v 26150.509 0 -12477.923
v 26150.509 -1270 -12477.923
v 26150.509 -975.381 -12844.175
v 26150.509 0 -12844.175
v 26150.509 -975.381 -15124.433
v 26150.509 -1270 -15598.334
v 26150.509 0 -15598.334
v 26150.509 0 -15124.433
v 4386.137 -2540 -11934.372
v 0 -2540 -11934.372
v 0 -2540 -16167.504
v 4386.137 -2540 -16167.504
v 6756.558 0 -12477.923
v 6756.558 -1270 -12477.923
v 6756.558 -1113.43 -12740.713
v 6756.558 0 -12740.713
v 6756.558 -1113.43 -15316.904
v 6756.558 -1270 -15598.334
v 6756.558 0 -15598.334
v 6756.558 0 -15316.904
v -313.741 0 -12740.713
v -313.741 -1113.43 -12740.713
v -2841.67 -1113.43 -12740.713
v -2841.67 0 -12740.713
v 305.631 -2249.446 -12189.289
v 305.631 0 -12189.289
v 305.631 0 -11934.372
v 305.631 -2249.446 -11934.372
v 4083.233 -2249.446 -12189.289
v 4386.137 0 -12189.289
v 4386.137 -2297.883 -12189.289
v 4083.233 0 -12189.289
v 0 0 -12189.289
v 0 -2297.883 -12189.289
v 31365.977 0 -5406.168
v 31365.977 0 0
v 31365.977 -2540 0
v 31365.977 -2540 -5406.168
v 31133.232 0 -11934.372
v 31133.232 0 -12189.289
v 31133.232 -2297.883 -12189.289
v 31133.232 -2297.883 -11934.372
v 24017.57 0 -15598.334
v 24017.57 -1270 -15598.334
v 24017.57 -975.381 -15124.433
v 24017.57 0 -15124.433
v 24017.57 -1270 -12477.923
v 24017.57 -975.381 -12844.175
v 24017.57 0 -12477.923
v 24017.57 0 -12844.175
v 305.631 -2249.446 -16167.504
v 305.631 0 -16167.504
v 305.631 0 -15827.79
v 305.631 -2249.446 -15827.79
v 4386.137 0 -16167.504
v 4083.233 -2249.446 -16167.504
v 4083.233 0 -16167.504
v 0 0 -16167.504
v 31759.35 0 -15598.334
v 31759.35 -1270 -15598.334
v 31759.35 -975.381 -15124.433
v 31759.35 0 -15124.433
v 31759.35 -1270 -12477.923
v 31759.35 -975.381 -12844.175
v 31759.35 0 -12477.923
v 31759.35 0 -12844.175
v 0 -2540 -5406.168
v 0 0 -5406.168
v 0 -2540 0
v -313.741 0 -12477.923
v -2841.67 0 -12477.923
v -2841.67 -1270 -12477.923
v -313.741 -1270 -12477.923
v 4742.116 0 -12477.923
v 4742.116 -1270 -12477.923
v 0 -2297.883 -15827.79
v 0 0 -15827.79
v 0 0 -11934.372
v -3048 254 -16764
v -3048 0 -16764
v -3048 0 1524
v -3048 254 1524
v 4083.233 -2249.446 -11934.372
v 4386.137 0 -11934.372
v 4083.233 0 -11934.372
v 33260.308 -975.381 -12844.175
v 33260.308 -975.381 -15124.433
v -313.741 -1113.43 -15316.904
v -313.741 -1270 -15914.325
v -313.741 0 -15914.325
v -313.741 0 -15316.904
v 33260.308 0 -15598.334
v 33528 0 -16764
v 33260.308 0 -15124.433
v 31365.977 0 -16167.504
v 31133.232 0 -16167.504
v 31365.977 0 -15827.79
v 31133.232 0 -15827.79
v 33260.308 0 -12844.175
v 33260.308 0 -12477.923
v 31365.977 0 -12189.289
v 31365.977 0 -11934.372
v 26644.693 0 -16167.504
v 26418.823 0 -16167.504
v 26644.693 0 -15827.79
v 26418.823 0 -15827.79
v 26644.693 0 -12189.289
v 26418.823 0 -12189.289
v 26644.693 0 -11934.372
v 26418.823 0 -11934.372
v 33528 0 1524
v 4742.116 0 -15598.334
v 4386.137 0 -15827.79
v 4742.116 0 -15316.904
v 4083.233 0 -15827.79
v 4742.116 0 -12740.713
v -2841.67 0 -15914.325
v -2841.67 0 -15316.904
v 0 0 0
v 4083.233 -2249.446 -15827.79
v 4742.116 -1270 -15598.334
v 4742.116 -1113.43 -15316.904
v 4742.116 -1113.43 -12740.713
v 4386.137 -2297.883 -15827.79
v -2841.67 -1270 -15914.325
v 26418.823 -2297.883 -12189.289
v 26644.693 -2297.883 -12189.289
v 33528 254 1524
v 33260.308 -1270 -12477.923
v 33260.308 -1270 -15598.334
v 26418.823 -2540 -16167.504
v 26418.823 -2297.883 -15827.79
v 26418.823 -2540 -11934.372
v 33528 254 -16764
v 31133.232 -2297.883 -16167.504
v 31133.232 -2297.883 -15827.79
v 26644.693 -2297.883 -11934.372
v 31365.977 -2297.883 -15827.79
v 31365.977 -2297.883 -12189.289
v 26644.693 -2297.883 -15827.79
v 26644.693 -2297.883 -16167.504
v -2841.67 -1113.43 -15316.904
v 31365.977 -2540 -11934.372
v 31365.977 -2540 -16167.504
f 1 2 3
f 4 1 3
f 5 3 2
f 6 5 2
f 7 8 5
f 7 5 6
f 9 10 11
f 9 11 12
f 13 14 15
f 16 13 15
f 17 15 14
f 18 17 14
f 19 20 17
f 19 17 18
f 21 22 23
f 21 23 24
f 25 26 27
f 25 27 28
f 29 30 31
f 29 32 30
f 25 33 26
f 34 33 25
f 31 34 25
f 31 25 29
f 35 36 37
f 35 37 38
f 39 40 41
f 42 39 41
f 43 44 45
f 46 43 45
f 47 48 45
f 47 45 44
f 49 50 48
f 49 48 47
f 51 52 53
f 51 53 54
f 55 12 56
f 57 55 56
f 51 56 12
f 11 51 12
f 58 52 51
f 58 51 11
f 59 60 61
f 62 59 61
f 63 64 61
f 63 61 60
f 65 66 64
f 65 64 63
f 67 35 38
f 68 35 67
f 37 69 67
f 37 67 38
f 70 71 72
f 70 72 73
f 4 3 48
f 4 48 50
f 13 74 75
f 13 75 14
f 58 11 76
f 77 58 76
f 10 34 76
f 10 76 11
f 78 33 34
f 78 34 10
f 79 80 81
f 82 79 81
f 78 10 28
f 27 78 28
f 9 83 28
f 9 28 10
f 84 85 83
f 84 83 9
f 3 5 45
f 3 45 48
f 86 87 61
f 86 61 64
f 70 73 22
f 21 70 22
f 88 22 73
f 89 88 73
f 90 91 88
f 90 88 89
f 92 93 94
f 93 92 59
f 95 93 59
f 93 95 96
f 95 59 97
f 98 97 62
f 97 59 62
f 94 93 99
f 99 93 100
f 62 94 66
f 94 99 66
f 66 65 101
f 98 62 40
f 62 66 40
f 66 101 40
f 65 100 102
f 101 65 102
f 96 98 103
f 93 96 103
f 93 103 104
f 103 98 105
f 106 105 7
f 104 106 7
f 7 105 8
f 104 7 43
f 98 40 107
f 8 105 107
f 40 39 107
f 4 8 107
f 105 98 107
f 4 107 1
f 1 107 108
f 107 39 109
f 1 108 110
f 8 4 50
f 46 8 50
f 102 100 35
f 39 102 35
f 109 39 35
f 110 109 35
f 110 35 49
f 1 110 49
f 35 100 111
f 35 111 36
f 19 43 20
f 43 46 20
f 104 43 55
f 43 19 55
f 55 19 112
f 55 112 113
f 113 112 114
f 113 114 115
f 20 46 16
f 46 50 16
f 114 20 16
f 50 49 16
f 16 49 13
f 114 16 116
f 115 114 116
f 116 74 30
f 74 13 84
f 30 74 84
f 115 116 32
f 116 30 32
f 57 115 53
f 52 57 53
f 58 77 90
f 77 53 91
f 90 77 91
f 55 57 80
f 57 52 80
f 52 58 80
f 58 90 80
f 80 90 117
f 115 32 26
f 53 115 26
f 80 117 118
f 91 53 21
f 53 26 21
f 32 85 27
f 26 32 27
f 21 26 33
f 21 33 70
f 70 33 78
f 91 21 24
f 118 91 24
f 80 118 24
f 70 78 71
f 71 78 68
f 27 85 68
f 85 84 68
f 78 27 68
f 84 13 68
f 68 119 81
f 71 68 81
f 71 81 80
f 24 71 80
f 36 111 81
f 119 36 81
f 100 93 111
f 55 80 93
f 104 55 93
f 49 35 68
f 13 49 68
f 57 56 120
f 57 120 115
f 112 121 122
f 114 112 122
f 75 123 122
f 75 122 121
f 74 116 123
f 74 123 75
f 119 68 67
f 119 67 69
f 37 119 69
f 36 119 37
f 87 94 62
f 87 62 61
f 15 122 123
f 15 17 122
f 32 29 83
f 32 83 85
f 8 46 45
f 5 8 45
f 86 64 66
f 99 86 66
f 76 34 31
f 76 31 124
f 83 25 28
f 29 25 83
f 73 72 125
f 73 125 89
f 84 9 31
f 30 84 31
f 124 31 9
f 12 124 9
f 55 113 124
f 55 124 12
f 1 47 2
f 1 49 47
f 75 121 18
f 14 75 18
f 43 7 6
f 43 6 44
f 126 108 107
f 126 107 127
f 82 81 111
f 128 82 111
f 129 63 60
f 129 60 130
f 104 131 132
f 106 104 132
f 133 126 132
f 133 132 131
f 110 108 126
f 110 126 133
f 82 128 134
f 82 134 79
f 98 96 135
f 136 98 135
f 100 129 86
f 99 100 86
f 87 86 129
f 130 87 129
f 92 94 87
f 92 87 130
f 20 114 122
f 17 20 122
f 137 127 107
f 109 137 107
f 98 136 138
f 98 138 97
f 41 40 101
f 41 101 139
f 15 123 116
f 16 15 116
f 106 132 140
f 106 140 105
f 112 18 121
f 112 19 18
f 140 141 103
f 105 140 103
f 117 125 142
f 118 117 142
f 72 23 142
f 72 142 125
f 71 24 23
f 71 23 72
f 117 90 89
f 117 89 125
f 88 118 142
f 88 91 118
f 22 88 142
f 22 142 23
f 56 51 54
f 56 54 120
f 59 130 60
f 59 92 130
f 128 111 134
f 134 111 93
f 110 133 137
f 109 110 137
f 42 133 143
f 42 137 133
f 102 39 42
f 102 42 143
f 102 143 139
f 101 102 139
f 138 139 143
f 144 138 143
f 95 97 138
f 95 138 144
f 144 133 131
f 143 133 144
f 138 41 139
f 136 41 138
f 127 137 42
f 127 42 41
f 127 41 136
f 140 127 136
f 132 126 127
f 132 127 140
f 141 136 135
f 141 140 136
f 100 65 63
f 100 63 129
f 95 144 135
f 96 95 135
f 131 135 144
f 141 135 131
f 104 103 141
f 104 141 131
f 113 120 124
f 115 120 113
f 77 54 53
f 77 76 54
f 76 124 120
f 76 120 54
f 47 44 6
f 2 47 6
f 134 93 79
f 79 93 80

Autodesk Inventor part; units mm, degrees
ref_plane "YZ Plane" through (0, 0, 0) normal (1, 0, 0) x (0, 1, 0)
ref_plane "XZ Plane" through (0, 0, 0) normal (0, 1, 0) x (-1, 0, 0)
ref_plane "XY Plane" through (0, 0, 0) normal (0, 0, 1) x (1, 0, 0)
sketch "Sketch1" plane through (0, 0, 0) normal (0, 1, 0) x (-1, 0, 0)
  line L0 (3048, 1524) -> (-3048, 1524)
  line L1 (-3048, 1524) -> (-3048, -1524)
  line L2 (-3048, -1524) -> (3048, -1524)
  line L3 (3048, -1524) -> (3048, 1524)
  line L4 (3048, 1524) -> (-3048, -1524) construction
  line L5 (-3048, 1524) -> (3048, -1524) construction
  point P0 (0, 0)
  dimension "d0" = 6096
  dimension "d1" = 3048
extrude "Extrusion1" add sketch "Sketch1" along normal blind 254
pattern_linear "Rectangular Pattern1" count 6 spacing 6096 along (1, 0, 0) count 6 spacing 3048 along (0, 0, -1) of "Extrusion1"
sketch "Sketch4" plane through (0, 0, 0) normal (0, -1, 0) x (1, 0, 0)
  line L0 (0, 0) -> (31365.9771, 0)
  line L1 (31365.9771, 0) -> (31365.9771, -5406.1685)
  line L2 (31365.9771, -5406.1685) -> (0, -5406.1685)
  line L3 (0, -5406.1685) -> (0, 0)
  line L4 (0, -11934.372) -> (4386.1366, -11934.372)
  line L5 (4386.1366, -11934.372) -> (4386.1366, -16167.5039)
  line L6 (4386.1366, -16167.5039) -> (0, -16167.5039)
  line L7 (0, -16167.5039) -> (0, -11934.372)
  line L8 (26418.823, -11934.372) -> (31365.9771, -11934.372)
  line L9 (31365.9771, -11934.372) -> (31365.9771, -16167.5039)
  line L10 (31365.9771, -16167.5039) -> (26418.823, -16167.5039)
  line L11 (26418.823, -16167.5039) -> (26418.823, -11934.372)
extrude "Extrusion4" add sketch "Sketch4" along normal blind 2540
sketch "Sketch5" plane through (4386.1366, 0, -16167.5039) normal (0, 0, -1) x (-1, 0, 0)
  line L0 (4080.5054, -2249.446) -> (302.9032, -2249.446)
  line L1 (302.9032, -2249.446) -> (302.9032, 0)
  line L2 (302.9032, 0) -> (4080.5054, 0)
  line L3 (4080.5054, 0) -> (4080.5054, -2249.446)
  point P0 (4386.1366, 0)
sketch "Sketch6" plane through (0, 0, -16167.5039) normal (-1, 0, 0) x (0, 0, 1)
  line L0 (17691.5039, 0) -> (-596.4961, 0) projected
  line L1 (3978.2146, -2297.8832) -> (339.7137, -2297.8832)
  line L2 (339.7137, -2297.8832) -> (339.7137, 0)
  line L3 (339.7137, 0) -> (3978.2146, 0)
  line L4 (3978.2146, 0) -> (3978.2146, -2297.8832)
  point P0 (16167.5039, 0)
extrude "Extrusion5" cut sketch "Sketch6" against normal through all
extrude "Extrusion6" cut sketch "Sketch5" against normal blind 5080
sketch "Sketch7" plane through (31365.9771, 0, -16167.5039) normal (0, 0, -1) x (-1, 0, 0)
  line L0 (0, 0) -> (4947.1541, 0) projected
  line L1 (4947.1541, -2297.8832) -> (0, -2297.8832) projected
  line L2 (4721.2839, 0) -> (232.745, 0)
  line L3 (232.745, 0) -> (232.745, -2297.8832)
  line L4 (232.745, -2297.8832) -> (4721.2839, -2297.8832)
  line L5 (4721.2839, -2297.8832) -> (4721.2839, 0)
  point P0 (31365.9771, 0)
extrude "Extrusion7" cut sketch "Sketch7" against normal blind 5080
sketch "Sketch8" plane through (0, 0, 0) normal (0, -1, 0) x (1, 0, 0)
  line L0 (-2841.6696, -12477.9229) -> (-313.7412, -12477.9229)
  line L1 (-313.7412, -12477.9229) -> (-313.7412, -15914.3253)
  line L2 (-313.7412, -15914.3253) -> (-2841.6696, -15914.3253)
  line L3 (-2841.6696, -15914.3253) -> (-2841.6696, -12477.9229)
  line L4 (31759.3504, -12477.9229) -> (33260.3079, -12477.9229)
  line L5 (33260.3079, -12477.9229) -> (33260.3079, -15598.3343)
  line L6 (33260.3079, -15598.3343) -> (31759.3504, -15598.3343)
  line L7 (31759.3504, -15598.3343) -> (31759.3504, -12477.9229)
  line L8 (24017.5697, -12477.9229) -> (26150.5093, -12477.9229)
  line L9 (26150.5093, -12477.9229) -> (26150.5093, -15598.3343)
  line L10 (26150.5093, -15598.3343) -> (24017.5697, -15598.3343)
  line L11 (24017.5697, -15598.3343) -> (24017.5697, -12477.9229)
  line L12 (4742.1156, -12477.9229) -> (6756.5585, -12477.9229)
  line L13 (6756.5585, -12477.9229) -> (6756.5585, -15598.3343)
  line L14 (6756.5585, -15598.3343) -> (4742.1156, -15598.3343)
  line L15 (4742.1156, -15598.3343) -> (4742.1156, -12477.9229)
  point P0 (0, 0)
extrude "Extrusion8" add sketch "Sketch8" along normal blind 1270
sketch "Sketch9" plane through (6756.5585, 0, -12477.9229) normal (1, 0, 0) x (0, 0, -1)
  line L0 (0, 0) -> (3120.4114, 0) projected
  line L1 (2838.981, -1113.43) -> (262.7905, -1113.43)
  line L2 (262.7905, -1113.43) -> (262.7905, 0)
  line L3 (262.7905, 0) -> (2838.981, 0)
  line L4 (2838.981, 0) -> (2838.981, -1113.43)
  point P0 (-12477.9229, 0)
extrude "Extrusion9" cut sketch "Sketch9" against normal through all
sketch "Sketch10" plane through (33260.3079, 0, -12477.9229) normal (1, 0, 0) x (0, 0, -1)
  line L0 (3120.4114, 0) -> (0, 0) projected
  line L1 (2646.51, -975.381) -> (366.2523, -975.381)
  line L2 (366.2523, -975.381) -> (366.2523, 0)
  line L3 (366.2523, 0) -> (2646.51, 0)
  line L4 (2646.51, 0) -> (2646.51, -975.381)
  point P0 (-12477.9229, 0)
extrude "Extrusion10" cut sketch "Sketch10" against normal through all
sketch "Sketch11" plane through (31365.9771, 0, -5406.1685) normal (0, 0, -1) x (-1, 0, 0)
  point P0 (31365.9771, 0)
properties part number "Foor"
